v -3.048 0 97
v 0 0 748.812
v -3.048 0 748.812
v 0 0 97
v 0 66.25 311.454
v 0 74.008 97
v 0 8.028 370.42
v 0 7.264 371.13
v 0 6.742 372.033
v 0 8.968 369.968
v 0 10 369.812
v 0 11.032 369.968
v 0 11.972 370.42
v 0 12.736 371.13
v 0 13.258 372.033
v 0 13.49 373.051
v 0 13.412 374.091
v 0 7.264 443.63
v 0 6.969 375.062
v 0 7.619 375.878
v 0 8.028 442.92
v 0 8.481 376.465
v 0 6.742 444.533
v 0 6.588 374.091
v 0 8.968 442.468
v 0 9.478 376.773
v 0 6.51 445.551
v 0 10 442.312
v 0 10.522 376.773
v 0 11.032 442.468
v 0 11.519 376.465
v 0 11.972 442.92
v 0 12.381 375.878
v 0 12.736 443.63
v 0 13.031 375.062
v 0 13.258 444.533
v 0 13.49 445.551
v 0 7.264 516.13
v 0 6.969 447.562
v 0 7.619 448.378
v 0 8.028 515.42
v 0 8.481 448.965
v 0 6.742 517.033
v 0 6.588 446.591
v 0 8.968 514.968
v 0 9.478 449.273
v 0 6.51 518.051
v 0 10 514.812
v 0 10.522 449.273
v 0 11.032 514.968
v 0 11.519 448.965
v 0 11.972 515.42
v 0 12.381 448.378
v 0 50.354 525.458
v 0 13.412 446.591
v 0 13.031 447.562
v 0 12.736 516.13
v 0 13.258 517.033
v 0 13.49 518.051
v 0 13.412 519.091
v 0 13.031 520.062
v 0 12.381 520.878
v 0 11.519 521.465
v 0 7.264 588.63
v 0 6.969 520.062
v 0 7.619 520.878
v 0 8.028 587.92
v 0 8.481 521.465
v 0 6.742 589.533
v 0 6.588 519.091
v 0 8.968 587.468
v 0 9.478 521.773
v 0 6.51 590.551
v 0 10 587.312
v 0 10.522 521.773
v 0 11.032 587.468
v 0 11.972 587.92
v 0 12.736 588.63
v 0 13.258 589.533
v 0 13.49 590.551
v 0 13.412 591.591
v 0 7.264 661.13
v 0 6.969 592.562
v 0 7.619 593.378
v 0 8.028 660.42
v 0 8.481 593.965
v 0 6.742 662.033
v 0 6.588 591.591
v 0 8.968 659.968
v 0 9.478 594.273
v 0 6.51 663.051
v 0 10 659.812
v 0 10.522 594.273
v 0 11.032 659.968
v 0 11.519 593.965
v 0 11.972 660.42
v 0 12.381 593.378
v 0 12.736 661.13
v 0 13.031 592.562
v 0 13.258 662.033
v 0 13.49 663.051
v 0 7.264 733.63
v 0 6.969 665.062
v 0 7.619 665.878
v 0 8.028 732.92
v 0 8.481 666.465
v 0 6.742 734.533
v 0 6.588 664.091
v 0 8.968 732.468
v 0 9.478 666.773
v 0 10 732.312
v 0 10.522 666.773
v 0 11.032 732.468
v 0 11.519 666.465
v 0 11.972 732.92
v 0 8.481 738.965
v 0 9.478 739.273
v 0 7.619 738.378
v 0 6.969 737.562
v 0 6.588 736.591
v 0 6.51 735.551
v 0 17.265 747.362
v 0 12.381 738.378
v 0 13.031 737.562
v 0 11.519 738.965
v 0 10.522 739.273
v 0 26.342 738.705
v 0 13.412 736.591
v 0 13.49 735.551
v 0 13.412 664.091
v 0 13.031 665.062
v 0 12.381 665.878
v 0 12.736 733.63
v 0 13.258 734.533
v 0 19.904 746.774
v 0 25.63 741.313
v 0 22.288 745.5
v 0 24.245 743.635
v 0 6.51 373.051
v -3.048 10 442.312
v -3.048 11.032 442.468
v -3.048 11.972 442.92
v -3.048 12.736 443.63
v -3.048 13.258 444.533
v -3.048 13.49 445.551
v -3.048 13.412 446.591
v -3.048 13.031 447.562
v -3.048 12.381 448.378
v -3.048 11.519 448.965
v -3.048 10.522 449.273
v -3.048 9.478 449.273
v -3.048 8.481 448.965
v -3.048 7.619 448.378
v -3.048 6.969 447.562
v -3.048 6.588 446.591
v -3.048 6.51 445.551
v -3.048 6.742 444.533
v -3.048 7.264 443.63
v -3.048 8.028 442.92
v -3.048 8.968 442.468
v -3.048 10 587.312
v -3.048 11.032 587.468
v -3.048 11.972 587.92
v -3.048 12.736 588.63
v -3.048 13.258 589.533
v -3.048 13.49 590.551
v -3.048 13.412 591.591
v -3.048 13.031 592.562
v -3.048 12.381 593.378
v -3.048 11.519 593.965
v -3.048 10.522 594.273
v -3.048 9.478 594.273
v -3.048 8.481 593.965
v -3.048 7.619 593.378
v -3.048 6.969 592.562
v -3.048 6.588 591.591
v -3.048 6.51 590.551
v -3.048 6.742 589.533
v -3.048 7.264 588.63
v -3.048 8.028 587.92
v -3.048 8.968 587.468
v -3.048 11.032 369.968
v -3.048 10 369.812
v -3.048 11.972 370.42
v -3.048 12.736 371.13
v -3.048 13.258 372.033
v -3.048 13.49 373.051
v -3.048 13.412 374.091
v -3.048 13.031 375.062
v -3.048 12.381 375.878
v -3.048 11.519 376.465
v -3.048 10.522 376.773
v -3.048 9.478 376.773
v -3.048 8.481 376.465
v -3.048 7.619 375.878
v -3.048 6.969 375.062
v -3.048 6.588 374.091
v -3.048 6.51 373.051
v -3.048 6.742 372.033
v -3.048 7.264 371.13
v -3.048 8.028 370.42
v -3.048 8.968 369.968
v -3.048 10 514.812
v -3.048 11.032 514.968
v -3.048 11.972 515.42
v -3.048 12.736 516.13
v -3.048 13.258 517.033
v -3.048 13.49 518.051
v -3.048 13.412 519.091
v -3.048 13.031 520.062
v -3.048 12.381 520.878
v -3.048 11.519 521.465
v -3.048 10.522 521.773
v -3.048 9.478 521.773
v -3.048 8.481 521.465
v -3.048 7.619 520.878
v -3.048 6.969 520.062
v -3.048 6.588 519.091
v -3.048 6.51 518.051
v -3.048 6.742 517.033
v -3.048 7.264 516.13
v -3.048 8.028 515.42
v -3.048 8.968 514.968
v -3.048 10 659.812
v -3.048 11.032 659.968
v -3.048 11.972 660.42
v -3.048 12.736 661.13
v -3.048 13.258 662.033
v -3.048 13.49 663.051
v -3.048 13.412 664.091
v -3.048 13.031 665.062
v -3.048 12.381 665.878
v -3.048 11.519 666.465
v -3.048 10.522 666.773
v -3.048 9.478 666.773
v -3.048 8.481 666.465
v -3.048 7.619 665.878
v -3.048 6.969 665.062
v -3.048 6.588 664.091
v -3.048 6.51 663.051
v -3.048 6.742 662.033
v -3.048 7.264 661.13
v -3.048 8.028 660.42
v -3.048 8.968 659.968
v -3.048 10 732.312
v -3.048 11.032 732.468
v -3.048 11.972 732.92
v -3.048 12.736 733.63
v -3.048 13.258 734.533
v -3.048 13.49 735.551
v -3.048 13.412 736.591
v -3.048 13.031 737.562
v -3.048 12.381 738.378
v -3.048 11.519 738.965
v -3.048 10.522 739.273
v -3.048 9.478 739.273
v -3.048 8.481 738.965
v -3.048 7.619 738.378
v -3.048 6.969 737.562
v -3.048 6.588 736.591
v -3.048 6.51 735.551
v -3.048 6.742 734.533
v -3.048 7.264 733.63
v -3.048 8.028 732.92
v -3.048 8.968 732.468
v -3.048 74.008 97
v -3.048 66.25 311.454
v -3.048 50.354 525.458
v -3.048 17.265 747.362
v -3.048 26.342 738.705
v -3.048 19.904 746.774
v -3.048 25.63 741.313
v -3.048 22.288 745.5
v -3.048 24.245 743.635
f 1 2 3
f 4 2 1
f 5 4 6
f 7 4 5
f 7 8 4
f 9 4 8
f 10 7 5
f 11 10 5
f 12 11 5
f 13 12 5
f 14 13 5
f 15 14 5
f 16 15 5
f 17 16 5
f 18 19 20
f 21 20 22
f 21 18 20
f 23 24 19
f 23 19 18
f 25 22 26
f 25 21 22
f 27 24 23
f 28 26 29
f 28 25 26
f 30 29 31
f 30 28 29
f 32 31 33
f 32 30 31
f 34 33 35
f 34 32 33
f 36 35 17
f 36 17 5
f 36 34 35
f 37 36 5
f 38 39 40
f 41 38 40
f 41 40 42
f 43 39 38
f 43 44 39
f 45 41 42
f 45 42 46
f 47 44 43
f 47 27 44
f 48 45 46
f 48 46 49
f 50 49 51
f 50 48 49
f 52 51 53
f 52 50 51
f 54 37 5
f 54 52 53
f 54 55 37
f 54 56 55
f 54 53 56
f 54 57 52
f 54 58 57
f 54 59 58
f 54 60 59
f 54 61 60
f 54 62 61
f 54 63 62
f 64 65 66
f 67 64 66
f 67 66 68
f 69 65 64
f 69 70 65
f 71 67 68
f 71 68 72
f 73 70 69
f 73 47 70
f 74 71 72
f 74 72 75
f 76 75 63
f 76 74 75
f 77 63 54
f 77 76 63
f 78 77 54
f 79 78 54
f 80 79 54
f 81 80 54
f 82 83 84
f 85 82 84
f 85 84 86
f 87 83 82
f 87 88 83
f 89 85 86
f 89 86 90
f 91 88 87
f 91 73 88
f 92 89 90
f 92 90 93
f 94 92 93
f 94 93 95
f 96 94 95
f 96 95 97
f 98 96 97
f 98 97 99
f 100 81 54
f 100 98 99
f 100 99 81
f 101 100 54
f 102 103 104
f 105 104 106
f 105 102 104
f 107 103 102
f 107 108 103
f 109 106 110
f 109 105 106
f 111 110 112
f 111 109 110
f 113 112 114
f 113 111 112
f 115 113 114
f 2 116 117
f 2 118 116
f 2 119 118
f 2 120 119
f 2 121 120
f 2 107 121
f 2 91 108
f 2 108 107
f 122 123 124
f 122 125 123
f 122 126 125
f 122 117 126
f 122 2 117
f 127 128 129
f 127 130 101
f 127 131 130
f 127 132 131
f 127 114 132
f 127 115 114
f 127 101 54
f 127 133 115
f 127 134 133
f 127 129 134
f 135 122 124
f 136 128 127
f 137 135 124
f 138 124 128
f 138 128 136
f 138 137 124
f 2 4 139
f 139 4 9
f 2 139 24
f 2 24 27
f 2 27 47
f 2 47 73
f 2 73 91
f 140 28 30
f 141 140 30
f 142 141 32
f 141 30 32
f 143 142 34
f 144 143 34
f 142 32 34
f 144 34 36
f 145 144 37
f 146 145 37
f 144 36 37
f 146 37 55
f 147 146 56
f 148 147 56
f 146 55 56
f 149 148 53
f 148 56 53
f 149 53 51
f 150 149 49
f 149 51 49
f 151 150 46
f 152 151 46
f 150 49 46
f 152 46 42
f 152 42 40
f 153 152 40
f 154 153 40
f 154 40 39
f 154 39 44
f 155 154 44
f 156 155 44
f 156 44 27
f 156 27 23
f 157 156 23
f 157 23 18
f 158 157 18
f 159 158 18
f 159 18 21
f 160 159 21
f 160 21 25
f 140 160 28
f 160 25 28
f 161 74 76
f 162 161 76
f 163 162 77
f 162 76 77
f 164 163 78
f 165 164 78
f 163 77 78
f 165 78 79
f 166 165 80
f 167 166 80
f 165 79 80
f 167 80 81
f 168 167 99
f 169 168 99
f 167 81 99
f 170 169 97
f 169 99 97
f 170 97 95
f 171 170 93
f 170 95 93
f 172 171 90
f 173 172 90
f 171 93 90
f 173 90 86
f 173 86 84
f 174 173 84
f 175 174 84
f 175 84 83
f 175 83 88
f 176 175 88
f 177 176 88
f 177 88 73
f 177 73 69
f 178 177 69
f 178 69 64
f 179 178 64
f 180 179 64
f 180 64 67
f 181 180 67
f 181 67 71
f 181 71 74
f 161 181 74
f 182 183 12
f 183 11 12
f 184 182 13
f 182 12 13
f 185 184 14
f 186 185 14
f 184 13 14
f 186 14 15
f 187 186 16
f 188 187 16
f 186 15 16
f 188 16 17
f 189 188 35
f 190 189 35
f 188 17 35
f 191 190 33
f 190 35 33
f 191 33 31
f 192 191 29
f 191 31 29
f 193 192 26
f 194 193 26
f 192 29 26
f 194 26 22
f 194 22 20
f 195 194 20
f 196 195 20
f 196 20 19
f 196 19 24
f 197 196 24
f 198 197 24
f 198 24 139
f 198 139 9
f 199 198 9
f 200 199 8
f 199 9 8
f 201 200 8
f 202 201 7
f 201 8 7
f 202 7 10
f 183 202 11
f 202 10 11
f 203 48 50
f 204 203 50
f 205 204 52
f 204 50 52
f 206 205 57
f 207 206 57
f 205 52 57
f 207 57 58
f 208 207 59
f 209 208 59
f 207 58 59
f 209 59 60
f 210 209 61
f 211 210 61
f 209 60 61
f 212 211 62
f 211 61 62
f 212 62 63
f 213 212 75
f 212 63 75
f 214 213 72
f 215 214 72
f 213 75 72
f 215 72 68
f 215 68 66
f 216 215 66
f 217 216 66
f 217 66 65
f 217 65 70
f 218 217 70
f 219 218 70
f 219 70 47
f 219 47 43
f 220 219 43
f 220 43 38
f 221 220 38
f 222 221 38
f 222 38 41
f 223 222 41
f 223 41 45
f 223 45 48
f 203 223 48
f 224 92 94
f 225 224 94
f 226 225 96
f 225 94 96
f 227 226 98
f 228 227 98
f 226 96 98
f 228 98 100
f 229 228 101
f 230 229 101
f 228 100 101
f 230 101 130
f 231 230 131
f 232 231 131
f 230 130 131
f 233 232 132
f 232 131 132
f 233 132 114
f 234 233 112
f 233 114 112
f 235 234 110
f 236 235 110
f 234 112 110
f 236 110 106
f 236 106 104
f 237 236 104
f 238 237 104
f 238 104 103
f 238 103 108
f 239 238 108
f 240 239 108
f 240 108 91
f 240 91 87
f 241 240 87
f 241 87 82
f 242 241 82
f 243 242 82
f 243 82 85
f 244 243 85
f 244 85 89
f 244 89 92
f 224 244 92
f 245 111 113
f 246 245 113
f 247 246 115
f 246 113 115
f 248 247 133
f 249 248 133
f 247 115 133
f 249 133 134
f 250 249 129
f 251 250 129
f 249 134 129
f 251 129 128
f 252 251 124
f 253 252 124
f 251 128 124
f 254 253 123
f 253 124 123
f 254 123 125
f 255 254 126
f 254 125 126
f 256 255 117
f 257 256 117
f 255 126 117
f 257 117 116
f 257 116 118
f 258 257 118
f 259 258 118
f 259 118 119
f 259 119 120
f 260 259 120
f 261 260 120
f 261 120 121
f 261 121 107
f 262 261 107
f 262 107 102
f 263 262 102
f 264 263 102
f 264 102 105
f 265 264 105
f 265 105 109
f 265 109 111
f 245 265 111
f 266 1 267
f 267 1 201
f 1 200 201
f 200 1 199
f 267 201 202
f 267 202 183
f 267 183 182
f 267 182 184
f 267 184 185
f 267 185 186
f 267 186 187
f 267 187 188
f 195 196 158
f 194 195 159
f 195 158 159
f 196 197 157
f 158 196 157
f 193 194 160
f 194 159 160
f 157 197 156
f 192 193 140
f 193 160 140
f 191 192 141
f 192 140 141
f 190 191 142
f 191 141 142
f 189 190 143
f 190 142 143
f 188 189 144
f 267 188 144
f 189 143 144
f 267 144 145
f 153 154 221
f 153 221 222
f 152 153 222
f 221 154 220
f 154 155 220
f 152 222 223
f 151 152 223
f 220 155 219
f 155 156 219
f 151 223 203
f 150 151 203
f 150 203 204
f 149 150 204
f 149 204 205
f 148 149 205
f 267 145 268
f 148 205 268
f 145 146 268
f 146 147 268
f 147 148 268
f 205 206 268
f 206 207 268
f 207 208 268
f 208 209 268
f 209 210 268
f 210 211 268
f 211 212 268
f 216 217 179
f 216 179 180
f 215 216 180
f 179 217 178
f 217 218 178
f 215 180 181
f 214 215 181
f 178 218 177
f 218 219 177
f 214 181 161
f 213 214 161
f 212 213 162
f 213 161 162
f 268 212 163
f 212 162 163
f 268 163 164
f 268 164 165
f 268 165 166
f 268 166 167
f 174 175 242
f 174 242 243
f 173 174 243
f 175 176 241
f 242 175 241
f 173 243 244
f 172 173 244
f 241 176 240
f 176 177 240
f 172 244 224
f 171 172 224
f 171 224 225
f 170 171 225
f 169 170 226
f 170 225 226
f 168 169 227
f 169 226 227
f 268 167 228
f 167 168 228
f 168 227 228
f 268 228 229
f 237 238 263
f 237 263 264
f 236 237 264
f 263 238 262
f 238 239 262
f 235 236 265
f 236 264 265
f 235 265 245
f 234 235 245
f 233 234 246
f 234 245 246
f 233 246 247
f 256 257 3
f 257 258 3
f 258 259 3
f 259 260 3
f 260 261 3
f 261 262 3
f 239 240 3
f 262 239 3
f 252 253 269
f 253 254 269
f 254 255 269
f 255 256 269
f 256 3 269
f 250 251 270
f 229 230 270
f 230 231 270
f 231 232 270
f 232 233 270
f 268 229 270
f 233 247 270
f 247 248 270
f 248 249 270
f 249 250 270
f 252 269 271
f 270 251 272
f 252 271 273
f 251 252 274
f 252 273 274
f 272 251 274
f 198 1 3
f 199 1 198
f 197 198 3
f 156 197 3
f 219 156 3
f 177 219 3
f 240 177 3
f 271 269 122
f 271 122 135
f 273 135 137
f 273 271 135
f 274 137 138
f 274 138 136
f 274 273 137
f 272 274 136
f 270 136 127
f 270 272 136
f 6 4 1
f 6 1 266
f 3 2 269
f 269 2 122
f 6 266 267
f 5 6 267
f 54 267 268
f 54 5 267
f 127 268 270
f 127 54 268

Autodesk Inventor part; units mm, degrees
ref_plane "YZ Plane" through (0, 0, 0) normal (1, 0, 0) x (0, 1, 0)
ref_plane "XZ Plane" through (0, 0, 0) normal (0, 1, 0) x (-1, 0, 0)
ref_plane "XY Plane" through (0, 0, 0) normal (0, 0, 1) x (1, 0, 0)
sketch "Sketch1" plane through (0, 0, 0) normal (1, 0, 0) x (0, 1, 0)
  line L0 (25, 748.8121) -> (0, 748.8121)
  line L1 (0, 748.8121) -> (0, -748.8121)
  line L2 (0, -748.8121) -> (25, -748.8121)
  arc A0 (25, -748.8121) -> (25, 748.8121) centre (-5575.159, 0) ccw
  line L3 (0, 748.8121) -> (25.2835, 746.689)
  line L4 (0, -748.8121) -> (25.2835, -746.689)
  line L5 (0, 97) -> (74.0083, 97)
  point P0 (0, 0)
  point P1 (0, 0)
  dimension "d2" = 25
  dimension "d3" = 5650
  dimension "d7" = 85.2
  dimension "d8" = 85.2
  dimension "d33" = 97
  dimension "d34" = 651.812
extrude "Plate1" add sketch "Sketch1" against normal blind 3.048 contours L3 A0 L5 L1
fillet "Corner Round3" radius 10 1 edges at (-1.524, 25.2835, 746.689)
sketch "Sketch4" plane through (0, 0, 0) normal (1, 0, 0) x (0, 0, -1)
  circle A0 centre (-735.8121, 10) radius 3.5
  line L0 (-748.8121, 0) -> (-97, 0) projected
  point P0 (0, 0)
  dimension "d23" = 7
  dimension "d25" = 10
  dimension "d32" = 13
extrude "Extrusion1" cut sketch "Sketch4" against normal through all
pattern_linear "Rectangular Pattern2" count 6 spacing 72.5 along (0, 0, -1) of "Extrusion1"
equation "\"BendReliefWidth\" = Thickness"
equation "\"BendReliefDepth\" = 0.5 * Thickness"
equation "\"CornerReliefSize\" = 4 * Thickness"
equation "\"MinimumRemnant\" = 2 * Thickness"
equation "\"TransitionRadius\" = BendRadius"
equation "\"JacobiRadiusSize\" = BendRadius"
equation "\"GapSize\" = Thickness"
equation "\"BendRadius\" = Thickness"
properties part number "MSC 083 top support gills" material "Stainless Steel"
